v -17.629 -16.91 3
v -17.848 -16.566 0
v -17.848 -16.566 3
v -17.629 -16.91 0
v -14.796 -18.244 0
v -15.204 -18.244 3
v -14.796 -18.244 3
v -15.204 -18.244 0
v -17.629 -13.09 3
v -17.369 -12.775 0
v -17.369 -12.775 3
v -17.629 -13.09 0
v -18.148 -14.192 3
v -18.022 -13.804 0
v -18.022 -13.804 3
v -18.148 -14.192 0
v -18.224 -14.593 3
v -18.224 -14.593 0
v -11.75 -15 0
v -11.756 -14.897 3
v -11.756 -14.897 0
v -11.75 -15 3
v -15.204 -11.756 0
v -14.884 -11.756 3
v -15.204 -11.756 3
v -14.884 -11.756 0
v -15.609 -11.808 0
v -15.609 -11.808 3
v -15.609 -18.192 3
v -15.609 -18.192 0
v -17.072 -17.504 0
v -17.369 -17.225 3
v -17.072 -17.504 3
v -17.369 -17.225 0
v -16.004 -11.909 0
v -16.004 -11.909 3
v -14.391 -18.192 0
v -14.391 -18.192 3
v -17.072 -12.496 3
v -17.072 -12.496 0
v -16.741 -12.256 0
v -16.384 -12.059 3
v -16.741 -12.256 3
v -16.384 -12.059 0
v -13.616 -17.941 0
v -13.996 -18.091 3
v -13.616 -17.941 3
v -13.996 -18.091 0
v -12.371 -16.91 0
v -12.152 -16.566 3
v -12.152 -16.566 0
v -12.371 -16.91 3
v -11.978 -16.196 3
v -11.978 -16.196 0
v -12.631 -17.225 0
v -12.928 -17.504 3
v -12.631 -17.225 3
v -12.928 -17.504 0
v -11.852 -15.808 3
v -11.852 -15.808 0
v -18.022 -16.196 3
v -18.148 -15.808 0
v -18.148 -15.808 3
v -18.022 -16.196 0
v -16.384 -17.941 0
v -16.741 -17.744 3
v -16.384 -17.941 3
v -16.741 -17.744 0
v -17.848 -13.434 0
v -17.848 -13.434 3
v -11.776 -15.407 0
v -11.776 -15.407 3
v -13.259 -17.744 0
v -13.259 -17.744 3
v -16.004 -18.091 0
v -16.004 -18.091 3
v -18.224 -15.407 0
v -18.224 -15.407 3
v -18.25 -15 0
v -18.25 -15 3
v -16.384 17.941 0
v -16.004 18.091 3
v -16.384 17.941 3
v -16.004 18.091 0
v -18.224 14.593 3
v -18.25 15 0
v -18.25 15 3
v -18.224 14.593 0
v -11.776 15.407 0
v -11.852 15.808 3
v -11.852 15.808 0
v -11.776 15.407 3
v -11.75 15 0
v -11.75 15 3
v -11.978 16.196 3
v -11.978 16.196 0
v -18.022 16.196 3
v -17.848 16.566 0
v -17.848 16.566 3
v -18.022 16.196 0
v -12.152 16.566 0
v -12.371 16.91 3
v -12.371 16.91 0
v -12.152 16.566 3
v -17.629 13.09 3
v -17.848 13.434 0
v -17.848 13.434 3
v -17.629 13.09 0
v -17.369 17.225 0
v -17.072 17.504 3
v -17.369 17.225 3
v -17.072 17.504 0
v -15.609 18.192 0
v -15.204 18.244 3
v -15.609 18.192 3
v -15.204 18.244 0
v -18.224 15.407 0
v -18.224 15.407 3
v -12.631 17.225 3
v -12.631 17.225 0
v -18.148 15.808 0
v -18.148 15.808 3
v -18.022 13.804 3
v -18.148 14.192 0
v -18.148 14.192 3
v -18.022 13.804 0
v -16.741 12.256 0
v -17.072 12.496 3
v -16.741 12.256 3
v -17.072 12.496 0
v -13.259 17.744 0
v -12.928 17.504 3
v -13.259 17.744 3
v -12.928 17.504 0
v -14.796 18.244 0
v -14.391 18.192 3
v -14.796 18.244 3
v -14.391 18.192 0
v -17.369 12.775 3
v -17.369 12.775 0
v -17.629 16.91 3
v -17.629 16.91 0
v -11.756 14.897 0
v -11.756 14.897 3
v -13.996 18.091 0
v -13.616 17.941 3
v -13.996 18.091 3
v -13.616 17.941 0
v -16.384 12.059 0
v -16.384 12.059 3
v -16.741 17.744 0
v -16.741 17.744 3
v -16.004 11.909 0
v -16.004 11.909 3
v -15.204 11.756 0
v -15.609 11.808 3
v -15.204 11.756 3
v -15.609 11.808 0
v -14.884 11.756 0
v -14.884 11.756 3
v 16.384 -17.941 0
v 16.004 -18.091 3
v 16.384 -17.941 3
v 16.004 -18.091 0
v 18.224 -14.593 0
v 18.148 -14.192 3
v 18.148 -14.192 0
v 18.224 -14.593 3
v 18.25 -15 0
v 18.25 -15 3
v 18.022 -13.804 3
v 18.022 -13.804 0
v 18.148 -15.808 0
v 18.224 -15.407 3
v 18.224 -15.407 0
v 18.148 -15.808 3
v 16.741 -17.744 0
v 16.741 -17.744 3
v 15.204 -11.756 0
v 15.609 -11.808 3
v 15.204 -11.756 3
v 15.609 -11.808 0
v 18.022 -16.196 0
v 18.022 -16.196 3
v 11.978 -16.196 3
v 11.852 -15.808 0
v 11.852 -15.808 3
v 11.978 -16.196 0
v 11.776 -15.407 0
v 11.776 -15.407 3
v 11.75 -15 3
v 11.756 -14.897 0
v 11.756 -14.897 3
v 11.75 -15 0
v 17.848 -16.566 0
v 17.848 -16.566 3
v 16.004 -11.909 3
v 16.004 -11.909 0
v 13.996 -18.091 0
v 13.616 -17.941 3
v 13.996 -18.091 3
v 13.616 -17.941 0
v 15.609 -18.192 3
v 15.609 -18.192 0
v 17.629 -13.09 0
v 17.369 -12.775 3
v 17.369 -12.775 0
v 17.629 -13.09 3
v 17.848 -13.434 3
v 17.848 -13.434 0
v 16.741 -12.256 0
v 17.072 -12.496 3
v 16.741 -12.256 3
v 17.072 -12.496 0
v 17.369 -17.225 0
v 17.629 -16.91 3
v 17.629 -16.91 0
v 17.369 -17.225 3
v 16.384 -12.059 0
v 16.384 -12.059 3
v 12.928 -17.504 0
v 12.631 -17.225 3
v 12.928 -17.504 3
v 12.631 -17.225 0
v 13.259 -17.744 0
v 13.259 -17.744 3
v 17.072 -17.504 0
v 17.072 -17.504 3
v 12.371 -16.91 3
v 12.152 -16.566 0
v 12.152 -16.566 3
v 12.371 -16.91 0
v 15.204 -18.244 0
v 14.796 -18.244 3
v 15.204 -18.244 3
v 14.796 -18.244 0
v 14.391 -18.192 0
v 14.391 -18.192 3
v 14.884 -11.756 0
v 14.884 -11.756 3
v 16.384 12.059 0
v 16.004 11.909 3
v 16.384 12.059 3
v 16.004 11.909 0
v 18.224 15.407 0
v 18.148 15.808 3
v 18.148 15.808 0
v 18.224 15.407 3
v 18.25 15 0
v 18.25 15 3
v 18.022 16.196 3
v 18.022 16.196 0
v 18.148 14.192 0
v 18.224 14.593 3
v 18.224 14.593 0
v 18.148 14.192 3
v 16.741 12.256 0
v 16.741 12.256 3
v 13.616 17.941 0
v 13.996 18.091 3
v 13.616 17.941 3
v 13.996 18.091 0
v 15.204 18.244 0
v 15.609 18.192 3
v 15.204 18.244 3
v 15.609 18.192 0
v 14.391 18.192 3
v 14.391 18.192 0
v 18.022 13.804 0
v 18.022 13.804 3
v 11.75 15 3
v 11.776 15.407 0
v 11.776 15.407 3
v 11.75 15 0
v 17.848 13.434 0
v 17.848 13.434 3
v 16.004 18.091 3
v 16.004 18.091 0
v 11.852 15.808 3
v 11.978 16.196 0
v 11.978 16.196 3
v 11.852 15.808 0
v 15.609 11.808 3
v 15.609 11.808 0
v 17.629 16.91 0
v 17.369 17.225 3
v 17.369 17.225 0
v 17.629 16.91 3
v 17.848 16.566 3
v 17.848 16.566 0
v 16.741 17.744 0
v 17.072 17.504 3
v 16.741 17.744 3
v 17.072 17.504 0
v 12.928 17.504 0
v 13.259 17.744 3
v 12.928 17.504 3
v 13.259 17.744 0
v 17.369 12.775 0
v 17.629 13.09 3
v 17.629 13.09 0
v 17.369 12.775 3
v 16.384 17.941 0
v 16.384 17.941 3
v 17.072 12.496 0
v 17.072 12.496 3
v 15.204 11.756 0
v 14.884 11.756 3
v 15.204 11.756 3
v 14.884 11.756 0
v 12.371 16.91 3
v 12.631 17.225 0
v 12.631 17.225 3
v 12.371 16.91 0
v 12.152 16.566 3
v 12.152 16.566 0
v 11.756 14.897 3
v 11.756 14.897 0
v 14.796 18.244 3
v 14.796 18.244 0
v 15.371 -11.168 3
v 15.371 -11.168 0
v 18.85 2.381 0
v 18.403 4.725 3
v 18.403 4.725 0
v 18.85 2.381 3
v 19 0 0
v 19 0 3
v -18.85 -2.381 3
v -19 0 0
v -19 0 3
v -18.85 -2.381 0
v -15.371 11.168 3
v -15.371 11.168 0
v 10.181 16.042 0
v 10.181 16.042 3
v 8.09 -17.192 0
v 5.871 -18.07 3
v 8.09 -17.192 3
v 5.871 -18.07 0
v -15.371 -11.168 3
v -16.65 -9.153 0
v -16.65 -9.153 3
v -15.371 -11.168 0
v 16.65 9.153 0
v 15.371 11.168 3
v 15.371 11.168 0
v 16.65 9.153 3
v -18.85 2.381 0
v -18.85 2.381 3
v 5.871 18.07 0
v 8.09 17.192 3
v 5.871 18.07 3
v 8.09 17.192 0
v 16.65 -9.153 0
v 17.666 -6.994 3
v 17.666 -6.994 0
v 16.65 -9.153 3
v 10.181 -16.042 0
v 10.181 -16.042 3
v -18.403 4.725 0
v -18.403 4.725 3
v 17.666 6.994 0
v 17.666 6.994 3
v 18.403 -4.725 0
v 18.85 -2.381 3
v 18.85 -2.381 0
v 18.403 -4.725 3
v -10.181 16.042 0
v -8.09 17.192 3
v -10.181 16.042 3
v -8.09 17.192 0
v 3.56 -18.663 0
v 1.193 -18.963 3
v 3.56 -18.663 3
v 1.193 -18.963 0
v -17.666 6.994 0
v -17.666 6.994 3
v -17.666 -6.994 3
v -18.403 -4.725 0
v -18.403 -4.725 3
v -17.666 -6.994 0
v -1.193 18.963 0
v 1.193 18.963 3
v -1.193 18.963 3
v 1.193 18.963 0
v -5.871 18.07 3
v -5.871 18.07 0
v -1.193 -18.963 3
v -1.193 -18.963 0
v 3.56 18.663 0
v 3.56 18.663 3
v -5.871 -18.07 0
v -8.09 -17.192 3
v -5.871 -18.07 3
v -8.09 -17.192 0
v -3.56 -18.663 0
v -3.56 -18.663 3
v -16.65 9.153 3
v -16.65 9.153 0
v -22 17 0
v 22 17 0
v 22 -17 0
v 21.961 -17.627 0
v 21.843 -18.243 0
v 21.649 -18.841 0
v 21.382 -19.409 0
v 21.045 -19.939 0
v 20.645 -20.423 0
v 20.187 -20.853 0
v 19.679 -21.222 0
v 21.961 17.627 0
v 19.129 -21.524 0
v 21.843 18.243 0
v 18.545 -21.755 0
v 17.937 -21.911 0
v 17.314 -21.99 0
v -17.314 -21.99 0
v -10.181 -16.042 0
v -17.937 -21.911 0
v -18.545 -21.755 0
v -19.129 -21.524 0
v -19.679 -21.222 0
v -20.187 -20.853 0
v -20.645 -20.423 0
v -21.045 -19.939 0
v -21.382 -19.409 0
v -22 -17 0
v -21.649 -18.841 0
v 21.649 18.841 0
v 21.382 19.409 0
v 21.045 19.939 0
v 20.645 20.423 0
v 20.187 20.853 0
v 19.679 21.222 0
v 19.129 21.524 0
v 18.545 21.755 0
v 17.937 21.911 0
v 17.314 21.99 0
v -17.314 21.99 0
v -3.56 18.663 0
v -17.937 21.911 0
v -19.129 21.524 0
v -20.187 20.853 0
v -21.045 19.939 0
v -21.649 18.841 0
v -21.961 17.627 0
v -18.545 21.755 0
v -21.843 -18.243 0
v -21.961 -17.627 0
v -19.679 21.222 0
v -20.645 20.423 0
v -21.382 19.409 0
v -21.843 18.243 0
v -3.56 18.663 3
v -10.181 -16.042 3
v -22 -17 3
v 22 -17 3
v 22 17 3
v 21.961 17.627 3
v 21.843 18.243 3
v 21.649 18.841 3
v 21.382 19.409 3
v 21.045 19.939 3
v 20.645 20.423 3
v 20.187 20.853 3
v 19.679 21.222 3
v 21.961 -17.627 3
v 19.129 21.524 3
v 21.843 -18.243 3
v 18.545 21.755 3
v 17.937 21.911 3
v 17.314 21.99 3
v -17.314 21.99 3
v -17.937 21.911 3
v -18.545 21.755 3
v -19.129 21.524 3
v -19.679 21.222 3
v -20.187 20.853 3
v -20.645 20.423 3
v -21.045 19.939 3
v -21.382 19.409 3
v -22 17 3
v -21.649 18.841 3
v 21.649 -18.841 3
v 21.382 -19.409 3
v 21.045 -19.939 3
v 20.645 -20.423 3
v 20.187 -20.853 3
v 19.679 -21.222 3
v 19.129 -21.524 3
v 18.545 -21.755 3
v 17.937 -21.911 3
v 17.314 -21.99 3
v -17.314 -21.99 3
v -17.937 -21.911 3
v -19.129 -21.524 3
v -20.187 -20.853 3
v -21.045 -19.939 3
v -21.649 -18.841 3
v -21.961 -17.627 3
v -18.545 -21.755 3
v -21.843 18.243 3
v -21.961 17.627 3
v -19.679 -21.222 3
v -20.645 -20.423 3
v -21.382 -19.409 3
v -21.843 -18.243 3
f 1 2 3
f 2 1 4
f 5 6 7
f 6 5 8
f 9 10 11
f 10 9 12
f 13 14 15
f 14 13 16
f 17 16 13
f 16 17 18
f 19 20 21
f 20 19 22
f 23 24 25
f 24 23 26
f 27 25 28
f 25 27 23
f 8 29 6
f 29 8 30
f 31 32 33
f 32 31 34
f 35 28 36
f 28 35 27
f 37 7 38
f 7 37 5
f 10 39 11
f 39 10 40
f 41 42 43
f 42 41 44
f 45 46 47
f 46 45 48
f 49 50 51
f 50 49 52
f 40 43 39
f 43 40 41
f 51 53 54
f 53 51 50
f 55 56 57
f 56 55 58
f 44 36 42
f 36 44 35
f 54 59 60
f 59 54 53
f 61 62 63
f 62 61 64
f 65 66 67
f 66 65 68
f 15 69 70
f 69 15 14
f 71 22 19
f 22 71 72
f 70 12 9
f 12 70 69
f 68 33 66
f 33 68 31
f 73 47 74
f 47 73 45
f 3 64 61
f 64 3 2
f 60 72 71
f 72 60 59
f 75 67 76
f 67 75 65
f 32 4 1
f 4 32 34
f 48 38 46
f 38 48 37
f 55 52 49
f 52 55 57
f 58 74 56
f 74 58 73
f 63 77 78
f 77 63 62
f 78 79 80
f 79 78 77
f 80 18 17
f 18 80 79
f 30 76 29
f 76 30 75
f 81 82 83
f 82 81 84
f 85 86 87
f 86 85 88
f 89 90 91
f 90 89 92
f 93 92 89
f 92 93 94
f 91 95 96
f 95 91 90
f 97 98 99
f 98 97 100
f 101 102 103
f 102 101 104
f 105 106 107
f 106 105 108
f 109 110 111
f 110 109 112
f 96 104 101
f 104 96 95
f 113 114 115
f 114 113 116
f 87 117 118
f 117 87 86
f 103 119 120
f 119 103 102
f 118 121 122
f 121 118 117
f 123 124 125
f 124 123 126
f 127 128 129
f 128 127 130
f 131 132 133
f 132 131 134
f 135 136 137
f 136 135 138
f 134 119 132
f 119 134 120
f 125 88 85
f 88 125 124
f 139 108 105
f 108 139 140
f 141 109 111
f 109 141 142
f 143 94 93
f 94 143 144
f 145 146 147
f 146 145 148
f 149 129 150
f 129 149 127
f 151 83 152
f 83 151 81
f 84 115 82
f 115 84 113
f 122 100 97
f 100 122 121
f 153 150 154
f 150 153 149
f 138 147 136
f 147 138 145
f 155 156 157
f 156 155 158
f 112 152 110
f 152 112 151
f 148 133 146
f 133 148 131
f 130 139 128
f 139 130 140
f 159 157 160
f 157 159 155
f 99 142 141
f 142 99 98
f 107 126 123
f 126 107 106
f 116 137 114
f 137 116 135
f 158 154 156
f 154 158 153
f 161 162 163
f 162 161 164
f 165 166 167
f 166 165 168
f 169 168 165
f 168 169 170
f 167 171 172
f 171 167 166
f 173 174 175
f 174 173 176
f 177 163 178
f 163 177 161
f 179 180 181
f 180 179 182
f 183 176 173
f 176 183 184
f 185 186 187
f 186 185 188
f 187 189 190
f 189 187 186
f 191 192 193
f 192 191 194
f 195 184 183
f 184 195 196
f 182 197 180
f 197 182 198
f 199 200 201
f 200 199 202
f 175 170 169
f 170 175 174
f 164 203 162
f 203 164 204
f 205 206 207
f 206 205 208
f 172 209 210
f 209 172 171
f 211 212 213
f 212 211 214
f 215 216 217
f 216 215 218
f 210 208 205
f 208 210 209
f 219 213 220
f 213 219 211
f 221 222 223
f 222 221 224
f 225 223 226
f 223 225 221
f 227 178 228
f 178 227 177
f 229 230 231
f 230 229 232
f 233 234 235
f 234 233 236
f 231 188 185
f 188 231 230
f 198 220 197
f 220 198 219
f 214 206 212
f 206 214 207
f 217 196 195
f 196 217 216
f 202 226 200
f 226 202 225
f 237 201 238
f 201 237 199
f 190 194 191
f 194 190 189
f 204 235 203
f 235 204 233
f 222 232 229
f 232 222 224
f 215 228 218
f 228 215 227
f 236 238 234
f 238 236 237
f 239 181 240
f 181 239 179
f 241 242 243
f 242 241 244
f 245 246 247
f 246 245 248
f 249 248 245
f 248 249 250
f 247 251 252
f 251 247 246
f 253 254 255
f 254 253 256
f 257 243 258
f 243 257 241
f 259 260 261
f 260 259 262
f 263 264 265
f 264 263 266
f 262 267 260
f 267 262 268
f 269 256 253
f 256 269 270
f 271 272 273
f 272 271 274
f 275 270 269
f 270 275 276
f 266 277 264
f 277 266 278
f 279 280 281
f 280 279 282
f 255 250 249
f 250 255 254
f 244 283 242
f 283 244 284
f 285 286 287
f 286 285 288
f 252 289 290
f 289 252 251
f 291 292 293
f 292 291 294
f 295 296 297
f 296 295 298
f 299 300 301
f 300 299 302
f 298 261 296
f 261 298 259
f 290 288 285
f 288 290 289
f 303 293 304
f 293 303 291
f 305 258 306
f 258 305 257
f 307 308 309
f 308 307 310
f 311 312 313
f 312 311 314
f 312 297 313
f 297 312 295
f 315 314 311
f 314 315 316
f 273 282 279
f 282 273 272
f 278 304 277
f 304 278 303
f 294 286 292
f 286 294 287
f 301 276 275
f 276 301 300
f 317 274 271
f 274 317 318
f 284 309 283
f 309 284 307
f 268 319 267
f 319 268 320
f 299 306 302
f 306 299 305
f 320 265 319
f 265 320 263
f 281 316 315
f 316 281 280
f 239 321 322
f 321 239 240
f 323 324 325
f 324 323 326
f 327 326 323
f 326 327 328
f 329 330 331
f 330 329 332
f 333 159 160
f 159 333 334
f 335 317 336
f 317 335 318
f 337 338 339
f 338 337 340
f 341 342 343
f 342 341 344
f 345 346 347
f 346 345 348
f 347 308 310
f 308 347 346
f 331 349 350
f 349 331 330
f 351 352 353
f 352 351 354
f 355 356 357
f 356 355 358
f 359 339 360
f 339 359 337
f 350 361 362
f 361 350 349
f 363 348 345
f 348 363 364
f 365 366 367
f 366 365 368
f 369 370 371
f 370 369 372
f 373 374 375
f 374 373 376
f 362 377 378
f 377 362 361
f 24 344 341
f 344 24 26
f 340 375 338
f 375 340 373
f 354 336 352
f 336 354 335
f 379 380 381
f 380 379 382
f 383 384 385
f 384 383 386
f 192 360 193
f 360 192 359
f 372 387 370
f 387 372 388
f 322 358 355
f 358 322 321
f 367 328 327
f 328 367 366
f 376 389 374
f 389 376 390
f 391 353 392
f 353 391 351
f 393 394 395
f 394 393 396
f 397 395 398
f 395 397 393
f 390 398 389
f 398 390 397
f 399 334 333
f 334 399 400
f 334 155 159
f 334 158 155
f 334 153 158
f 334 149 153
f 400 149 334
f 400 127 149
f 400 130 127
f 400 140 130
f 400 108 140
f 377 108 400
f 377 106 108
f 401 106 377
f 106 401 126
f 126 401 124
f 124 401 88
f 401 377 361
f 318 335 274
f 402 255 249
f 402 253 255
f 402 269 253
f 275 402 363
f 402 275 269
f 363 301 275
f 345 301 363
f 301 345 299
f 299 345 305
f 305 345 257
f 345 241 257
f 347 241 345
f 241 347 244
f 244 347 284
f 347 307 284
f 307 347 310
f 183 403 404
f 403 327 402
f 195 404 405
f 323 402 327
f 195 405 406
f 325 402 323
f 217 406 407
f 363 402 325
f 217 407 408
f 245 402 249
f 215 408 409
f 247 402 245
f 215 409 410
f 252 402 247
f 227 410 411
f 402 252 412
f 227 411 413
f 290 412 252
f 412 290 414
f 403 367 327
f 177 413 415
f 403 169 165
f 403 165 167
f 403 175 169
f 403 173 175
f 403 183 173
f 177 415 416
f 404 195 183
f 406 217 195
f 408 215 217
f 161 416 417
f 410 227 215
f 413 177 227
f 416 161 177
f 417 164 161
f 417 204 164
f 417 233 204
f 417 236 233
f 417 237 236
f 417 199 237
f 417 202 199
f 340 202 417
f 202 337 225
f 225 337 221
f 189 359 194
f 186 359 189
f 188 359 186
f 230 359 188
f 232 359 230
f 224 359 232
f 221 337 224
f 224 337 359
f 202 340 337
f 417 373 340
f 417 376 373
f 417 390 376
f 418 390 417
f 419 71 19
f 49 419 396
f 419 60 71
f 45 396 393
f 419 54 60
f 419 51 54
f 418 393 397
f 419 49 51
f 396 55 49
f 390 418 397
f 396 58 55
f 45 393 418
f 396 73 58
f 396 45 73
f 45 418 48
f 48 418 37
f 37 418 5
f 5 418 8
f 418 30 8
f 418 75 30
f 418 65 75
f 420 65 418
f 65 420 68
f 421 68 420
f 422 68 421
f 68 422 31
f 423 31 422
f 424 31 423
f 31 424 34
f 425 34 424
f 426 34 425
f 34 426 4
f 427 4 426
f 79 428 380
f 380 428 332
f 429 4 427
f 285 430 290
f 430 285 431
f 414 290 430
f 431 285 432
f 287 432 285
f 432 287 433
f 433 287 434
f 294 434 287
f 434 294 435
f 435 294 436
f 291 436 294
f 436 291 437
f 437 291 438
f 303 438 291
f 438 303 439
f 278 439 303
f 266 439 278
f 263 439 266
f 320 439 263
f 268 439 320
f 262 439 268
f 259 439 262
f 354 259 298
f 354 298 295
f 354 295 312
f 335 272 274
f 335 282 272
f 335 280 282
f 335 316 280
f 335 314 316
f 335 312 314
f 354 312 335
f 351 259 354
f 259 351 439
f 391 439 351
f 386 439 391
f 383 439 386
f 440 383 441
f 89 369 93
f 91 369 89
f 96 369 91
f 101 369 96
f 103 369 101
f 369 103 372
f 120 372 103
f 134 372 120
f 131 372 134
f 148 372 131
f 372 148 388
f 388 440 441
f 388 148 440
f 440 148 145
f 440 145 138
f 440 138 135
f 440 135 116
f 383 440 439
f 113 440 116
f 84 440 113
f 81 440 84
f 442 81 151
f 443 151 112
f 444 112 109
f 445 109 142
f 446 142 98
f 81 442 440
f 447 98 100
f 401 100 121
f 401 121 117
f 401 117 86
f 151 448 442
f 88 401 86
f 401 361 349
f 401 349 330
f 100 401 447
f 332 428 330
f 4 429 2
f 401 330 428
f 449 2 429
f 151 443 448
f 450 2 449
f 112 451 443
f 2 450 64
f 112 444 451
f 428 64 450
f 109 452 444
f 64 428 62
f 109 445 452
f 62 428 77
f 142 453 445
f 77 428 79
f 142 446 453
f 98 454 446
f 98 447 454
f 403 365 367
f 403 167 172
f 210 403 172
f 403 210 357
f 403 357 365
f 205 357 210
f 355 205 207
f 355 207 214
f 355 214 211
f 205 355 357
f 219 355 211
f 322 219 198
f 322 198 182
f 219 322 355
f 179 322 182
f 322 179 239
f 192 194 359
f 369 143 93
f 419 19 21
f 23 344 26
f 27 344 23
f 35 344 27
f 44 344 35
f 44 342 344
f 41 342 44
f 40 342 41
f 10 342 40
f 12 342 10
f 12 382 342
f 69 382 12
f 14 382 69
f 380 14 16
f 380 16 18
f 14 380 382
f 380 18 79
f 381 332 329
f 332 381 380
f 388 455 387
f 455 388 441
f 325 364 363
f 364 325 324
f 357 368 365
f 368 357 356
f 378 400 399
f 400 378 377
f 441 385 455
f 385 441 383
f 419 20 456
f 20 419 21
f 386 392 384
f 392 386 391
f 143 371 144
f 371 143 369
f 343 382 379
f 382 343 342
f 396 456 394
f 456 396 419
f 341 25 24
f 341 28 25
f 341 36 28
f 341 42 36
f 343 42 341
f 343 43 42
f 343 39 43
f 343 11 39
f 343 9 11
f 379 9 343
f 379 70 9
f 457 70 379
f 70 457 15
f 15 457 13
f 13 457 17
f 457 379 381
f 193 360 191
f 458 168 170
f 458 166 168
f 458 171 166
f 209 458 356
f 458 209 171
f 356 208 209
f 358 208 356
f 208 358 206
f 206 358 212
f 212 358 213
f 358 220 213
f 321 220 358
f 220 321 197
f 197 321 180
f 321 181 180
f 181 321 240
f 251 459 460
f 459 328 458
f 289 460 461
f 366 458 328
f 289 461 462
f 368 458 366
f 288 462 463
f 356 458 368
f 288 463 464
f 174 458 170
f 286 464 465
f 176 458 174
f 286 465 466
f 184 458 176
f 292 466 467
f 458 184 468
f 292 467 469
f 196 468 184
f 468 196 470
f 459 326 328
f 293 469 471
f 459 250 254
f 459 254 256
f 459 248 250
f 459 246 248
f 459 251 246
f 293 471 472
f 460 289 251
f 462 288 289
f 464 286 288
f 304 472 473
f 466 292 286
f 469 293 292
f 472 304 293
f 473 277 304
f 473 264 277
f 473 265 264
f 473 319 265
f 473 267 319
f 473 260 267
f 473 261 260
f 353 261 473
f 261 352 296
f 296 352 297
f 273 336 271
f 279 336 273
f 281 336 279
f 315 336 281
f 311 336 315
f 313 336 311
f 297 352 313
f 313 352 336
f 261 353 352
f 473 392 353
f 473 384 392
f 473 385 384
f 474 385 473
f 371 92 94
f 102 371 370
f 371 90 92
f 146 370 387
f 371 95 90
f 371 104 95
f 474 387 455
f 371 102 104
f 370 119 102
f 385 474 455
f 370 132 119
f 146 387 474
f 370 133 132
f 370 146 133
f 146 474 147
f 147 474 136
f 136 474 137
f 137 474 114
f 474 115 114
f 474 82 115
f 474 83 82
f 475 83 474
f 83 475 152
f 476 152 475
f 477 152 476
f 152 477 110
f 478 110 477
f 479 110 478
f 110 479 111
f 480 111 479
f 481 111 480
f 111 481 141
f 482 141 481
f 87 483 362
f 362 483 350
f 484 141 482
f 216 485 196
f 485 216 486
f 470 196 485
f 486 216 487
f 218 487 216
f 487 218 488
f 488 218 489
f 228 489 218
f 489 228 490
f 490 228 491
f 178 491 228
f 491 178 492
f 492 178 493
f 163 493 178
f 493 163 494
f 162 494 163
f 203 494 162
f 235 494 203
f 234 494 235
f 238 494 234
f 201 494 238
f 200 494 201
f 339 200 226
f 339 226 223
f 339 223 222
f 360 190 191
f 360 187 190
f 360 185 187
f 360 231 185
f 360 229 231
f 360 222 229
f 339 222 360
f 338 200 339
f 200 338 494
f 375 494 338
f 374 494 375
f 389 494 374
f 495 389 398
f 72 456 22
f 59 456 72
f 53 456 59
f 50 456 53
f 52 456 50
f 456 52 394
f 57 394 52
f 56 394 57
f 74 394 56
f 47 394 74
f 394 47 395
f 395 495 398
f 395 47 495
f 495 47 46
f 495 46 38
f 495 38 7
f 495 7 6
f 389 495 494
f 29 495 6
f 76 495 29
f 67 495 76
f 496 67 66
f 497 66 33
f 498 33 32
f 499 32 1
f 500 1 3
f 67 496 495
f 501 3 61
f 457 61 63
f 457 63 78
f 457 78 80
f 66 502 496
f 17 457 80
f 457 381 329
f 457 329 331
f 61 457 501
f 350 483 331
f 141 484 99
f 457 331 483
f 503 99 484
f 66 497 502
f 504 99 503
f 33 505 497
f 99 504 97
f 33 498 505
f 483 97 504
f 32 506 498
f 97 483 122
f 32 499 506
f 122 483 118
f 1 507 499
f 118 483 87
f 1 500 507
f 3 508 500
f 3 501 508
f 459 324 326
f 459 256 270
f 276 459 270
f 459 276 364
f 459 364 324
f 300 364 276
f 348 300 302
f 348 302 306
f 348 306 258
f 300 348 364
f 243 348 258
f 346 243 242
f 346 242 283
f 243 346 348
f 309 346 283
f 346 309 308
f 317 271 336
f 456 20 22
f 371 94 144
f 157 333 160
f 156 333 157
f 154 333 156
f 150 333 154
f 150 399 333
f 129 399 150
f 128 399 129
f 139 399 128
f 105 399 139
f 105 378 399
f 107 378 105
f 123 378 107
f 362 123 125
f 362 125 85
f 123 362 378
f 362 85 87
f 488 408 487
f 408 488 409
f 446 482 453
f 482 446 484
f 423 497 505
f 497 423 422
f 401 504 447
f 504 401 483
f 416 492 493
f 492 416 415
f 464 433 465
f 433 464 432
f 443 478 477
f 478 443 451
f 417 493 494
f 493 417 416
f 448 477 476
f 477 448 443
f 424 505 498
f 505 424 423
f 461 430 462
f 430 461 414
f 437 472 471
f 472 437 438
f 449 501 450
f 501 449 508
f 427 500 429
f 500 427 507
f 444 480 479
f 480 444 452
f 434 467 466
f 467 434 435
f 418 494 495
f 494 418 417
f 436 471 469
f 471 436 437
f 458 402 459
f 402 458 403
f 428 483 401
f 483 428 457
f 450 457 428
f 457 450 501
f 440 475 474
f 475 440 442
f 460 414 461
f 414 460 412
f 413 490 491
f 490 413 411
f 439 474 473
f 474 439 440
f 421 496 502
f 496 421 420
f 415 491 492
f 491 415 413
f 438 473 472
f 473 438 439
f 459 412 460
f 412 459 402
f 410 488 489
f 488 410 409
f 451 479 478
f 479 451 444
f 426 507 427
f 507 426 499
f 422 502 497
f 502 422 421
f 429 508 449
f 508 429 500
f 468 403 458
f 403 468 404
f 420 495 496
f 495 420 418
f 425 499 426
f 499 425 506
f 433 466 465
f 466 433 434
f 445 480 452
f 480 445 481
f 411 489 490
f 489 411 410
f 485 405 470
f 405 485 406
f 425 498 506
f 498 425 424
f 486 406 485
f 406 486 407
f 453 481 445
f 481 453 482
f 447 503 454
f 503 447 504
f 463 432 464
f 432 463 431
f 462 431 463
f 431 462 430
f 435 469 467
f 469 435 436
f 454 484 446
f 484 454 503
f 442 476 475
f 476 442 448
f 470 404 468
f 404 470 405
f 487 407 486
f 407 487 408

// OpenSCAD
$fn = 50;


difference() {
	union() {
		hull() {
			translate(v = [-17.0000000000, 17.0000000000, 0]) {
				cylinder(h = 3, r = 5);
			}
			translate(v = [17.0000000000, 17.0000000000, 0]) {
				cylinder(h = 3, r = 5);
			}
			translate(v = [-17.0000000000, -17.0000000000, 0]) {
				cylinder(h = 3, r = 5);
			}
			translate(v = [17.0000000000, -17.0000000000, 0]) {
				cylinder(h = 3, r = 5);
			}
		}
	}
	union() {
		#translate(v = [-15.0000000000, -15.0000000000, -100.0000000000]) {
			cylinder(h = 200, r = 3.2500000000);
		}
		#translate(v = [-15.0000000000, 15.0000000000, -100.0000000000]) {
			cylinder(h = 200, r = 3.2500000000);
		}
		#translate(v = [15.0000000000, -15.0000000000, -100.0000000000]) {
			cylinder(h = 200, r = 3.2500000000);
		}
		#translate(v = [15.0000000000, 15.0000000000, -100.0000000000]) {
			cylinder(h = 200, r = 3.2500000000);
		}
		#cylinder(h = 3, r = 19.0000000000);
	}
}
